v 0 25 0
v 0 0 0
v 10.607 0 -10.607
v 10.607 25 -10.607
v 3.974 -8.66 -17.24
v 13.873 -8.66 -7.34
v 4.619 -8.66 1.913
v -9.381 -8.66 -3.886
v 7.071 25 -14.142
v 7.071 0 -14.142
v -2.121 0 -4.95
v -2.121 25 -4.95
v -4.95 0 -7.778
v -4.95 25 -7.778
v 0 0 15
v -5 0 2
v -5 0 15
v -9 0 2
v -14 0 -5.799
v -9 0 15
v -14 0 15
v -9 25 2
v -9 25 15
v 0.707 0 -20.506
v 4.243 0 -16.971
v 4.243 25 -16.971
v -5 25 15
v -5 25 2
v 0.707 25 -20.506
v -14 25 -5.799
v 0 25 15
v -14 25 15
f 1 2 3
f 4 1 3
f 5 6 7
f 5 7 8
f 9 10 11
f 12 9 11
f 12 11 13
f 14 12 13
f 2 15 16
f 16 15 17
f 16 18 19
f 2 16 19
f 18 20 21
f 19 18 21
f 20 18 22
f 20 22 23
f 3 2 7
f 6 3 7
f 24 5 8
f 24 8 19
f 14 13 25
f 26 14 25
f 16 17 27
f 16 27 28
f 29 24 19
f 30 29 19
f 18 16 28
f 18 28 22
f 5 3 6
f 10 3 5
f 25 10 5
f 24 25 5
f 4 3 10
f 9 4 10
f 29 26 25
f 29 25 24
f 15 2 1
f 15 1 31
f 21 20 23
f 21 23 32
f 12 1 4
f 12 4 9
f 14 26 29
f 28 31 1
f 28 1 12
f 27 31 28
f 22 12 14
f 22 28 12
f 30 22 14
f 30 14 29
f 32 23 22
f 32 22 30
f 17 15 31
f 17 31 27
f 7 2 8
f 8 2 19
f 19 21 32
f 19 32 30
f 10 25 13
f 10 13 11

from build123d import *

# Parameters (mm, degrees)
BOSS_EXTRUDE1_DEPTH = 25
BOSS_EXTRUDE3_REACH = 40.303


with BuildPart() as part:
    # Sketch2 → Boss-Extrude1 (new body)
    with BuildSketch(Plane(origin=(0, 0, 0), x_dir=(1, 0, 0), z_dir=(0, 1, 0))):
        Polygon((0, 0), (0, -15), (-5, -15), (-5, -2), (-9, -2), (-9, -15), (-14, -15), (-14, 5.798989873), align=None)
    boss_extrude1 = extrude(amount=BOSS_EXTRUDE1_DEPTH)

    # Mirror1: Boss-Extrude1 across plane
    add(boss_extrude1.mirror(Plane(origin=(0, 25, 0), x_dir=(0.9238795325112891, 0, 0.382683432365084), z_dir=(-0.382683432365084, 0, 0.9238795325112892))))

    # Boss-Extrude3: up to this plane
    boss_extrude3_end = Plane(origin=(10.606601718, 25, -10.606601718), z_dir=(0.7071067811865388, 0, -0.7071067811865563))
    # Sketch4 → Boss-Extrude3 (add, up to the surface)
    with BuildSketch(Plane(origin=(0, 0, 0), x_dir=(-0.9238795325112892, 0, -0.38268343236508406), z_dir=(0.3826834323650841, 0, -0.9238795325112893)), mode=Mode.PRIVATE) as boss_extrude3_sk1:
        Polygon((0, 0), (-5, -8.660254038), (10.153490804, -8.660254038), (15.153490804, 0), align=None)
    boss_extrude3_tool1 = split(extrude(boss_extrude3_sk1.sketch, amount=BOSS_EXTRUDE3_REACH, dir=(0.707106781187, 0, -0.707106781187), mode=Mode.PRIVATE), bisect_by=boss_extrude3_end, keep=Keep.BOTH, mode=Mode.PRIVATE)
    add(boss_extrude3_tool1.solids().sort_by_distance((-4.690301, -4.330127, -1.942786))[0])


solid = part.part
